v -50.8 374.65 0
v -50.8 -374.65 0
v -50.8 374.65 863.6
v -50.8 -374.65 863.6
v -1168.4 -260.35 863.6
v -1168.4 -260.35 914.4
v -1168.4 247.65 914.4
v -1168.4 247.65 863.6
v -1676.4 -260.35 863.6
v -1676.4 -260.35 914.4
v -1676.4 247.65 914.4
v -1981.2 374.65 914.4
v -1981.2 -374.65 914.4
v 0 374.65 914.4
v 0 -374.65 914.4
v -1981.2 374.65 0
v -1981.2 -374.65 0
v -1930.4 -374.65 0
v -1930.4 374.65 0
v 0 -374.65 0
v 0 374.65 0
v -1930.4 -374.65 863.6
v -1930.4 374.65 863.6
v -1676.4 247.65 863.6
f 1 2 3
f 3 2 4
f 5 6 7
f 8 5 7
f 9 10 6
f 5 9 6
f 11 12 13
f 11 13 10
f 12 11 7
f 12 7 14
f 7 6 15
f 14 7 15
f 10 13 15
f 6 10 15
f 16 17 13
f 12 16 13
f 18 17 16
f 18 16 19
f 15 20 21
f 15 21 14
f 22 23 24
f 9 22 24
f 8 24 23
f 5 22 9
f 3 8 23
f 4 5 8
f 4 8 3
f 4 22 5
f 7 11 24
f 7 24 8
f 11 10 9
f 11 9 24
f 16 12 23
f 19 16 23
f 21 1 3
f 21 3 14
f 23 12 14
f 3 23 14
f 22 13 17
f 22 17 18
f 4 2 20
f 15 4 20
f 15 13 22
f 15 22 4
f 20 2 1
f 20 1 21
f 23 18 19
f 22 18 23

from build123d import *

# Parameters (mm, degrees)
F0_W     = 1981.2
F0_H     = 914.4
F1_DEPTH = 374.65
F2_W     = 1879.6
F2_H     = 863.6
F3_DEPTH = 749.301
F4_W     = 508
F4_H     = 508
F5_DEPTH = 914.401


with BuildPart() as f1:
    # F0 (on Front) → F1 (new body, symmetric)
    with BuildSketch(Plane.XZ):
        with Locations((-990.6, 457.2)):
            Rectangle(F0_W, F0_H)
    extrude(amount=F1_DEPTH, both=True)

    # F2 (on face) → F3 (cut, through all)
    with BuildSketch(Plane.XZ.offset(374.65)):
        with Locations((-990.6, 431.8)):
            Rectangle(F2_W, F2_H)
    extrude(amount=-F3_DEPTH, mode=Mode.SUBTRACT)

    # F4 (on face) → F5 (cut, through all)
    with BuildSketch(Plane.XY.offset(914.4)):
        with Locations((-1422.4, -6.35)):
            Rectangle(F4_W, F4_H)
    extrude(amount=-F5_DEPTH, mode=Mode.SUBTRACT)


solid = f1.part
